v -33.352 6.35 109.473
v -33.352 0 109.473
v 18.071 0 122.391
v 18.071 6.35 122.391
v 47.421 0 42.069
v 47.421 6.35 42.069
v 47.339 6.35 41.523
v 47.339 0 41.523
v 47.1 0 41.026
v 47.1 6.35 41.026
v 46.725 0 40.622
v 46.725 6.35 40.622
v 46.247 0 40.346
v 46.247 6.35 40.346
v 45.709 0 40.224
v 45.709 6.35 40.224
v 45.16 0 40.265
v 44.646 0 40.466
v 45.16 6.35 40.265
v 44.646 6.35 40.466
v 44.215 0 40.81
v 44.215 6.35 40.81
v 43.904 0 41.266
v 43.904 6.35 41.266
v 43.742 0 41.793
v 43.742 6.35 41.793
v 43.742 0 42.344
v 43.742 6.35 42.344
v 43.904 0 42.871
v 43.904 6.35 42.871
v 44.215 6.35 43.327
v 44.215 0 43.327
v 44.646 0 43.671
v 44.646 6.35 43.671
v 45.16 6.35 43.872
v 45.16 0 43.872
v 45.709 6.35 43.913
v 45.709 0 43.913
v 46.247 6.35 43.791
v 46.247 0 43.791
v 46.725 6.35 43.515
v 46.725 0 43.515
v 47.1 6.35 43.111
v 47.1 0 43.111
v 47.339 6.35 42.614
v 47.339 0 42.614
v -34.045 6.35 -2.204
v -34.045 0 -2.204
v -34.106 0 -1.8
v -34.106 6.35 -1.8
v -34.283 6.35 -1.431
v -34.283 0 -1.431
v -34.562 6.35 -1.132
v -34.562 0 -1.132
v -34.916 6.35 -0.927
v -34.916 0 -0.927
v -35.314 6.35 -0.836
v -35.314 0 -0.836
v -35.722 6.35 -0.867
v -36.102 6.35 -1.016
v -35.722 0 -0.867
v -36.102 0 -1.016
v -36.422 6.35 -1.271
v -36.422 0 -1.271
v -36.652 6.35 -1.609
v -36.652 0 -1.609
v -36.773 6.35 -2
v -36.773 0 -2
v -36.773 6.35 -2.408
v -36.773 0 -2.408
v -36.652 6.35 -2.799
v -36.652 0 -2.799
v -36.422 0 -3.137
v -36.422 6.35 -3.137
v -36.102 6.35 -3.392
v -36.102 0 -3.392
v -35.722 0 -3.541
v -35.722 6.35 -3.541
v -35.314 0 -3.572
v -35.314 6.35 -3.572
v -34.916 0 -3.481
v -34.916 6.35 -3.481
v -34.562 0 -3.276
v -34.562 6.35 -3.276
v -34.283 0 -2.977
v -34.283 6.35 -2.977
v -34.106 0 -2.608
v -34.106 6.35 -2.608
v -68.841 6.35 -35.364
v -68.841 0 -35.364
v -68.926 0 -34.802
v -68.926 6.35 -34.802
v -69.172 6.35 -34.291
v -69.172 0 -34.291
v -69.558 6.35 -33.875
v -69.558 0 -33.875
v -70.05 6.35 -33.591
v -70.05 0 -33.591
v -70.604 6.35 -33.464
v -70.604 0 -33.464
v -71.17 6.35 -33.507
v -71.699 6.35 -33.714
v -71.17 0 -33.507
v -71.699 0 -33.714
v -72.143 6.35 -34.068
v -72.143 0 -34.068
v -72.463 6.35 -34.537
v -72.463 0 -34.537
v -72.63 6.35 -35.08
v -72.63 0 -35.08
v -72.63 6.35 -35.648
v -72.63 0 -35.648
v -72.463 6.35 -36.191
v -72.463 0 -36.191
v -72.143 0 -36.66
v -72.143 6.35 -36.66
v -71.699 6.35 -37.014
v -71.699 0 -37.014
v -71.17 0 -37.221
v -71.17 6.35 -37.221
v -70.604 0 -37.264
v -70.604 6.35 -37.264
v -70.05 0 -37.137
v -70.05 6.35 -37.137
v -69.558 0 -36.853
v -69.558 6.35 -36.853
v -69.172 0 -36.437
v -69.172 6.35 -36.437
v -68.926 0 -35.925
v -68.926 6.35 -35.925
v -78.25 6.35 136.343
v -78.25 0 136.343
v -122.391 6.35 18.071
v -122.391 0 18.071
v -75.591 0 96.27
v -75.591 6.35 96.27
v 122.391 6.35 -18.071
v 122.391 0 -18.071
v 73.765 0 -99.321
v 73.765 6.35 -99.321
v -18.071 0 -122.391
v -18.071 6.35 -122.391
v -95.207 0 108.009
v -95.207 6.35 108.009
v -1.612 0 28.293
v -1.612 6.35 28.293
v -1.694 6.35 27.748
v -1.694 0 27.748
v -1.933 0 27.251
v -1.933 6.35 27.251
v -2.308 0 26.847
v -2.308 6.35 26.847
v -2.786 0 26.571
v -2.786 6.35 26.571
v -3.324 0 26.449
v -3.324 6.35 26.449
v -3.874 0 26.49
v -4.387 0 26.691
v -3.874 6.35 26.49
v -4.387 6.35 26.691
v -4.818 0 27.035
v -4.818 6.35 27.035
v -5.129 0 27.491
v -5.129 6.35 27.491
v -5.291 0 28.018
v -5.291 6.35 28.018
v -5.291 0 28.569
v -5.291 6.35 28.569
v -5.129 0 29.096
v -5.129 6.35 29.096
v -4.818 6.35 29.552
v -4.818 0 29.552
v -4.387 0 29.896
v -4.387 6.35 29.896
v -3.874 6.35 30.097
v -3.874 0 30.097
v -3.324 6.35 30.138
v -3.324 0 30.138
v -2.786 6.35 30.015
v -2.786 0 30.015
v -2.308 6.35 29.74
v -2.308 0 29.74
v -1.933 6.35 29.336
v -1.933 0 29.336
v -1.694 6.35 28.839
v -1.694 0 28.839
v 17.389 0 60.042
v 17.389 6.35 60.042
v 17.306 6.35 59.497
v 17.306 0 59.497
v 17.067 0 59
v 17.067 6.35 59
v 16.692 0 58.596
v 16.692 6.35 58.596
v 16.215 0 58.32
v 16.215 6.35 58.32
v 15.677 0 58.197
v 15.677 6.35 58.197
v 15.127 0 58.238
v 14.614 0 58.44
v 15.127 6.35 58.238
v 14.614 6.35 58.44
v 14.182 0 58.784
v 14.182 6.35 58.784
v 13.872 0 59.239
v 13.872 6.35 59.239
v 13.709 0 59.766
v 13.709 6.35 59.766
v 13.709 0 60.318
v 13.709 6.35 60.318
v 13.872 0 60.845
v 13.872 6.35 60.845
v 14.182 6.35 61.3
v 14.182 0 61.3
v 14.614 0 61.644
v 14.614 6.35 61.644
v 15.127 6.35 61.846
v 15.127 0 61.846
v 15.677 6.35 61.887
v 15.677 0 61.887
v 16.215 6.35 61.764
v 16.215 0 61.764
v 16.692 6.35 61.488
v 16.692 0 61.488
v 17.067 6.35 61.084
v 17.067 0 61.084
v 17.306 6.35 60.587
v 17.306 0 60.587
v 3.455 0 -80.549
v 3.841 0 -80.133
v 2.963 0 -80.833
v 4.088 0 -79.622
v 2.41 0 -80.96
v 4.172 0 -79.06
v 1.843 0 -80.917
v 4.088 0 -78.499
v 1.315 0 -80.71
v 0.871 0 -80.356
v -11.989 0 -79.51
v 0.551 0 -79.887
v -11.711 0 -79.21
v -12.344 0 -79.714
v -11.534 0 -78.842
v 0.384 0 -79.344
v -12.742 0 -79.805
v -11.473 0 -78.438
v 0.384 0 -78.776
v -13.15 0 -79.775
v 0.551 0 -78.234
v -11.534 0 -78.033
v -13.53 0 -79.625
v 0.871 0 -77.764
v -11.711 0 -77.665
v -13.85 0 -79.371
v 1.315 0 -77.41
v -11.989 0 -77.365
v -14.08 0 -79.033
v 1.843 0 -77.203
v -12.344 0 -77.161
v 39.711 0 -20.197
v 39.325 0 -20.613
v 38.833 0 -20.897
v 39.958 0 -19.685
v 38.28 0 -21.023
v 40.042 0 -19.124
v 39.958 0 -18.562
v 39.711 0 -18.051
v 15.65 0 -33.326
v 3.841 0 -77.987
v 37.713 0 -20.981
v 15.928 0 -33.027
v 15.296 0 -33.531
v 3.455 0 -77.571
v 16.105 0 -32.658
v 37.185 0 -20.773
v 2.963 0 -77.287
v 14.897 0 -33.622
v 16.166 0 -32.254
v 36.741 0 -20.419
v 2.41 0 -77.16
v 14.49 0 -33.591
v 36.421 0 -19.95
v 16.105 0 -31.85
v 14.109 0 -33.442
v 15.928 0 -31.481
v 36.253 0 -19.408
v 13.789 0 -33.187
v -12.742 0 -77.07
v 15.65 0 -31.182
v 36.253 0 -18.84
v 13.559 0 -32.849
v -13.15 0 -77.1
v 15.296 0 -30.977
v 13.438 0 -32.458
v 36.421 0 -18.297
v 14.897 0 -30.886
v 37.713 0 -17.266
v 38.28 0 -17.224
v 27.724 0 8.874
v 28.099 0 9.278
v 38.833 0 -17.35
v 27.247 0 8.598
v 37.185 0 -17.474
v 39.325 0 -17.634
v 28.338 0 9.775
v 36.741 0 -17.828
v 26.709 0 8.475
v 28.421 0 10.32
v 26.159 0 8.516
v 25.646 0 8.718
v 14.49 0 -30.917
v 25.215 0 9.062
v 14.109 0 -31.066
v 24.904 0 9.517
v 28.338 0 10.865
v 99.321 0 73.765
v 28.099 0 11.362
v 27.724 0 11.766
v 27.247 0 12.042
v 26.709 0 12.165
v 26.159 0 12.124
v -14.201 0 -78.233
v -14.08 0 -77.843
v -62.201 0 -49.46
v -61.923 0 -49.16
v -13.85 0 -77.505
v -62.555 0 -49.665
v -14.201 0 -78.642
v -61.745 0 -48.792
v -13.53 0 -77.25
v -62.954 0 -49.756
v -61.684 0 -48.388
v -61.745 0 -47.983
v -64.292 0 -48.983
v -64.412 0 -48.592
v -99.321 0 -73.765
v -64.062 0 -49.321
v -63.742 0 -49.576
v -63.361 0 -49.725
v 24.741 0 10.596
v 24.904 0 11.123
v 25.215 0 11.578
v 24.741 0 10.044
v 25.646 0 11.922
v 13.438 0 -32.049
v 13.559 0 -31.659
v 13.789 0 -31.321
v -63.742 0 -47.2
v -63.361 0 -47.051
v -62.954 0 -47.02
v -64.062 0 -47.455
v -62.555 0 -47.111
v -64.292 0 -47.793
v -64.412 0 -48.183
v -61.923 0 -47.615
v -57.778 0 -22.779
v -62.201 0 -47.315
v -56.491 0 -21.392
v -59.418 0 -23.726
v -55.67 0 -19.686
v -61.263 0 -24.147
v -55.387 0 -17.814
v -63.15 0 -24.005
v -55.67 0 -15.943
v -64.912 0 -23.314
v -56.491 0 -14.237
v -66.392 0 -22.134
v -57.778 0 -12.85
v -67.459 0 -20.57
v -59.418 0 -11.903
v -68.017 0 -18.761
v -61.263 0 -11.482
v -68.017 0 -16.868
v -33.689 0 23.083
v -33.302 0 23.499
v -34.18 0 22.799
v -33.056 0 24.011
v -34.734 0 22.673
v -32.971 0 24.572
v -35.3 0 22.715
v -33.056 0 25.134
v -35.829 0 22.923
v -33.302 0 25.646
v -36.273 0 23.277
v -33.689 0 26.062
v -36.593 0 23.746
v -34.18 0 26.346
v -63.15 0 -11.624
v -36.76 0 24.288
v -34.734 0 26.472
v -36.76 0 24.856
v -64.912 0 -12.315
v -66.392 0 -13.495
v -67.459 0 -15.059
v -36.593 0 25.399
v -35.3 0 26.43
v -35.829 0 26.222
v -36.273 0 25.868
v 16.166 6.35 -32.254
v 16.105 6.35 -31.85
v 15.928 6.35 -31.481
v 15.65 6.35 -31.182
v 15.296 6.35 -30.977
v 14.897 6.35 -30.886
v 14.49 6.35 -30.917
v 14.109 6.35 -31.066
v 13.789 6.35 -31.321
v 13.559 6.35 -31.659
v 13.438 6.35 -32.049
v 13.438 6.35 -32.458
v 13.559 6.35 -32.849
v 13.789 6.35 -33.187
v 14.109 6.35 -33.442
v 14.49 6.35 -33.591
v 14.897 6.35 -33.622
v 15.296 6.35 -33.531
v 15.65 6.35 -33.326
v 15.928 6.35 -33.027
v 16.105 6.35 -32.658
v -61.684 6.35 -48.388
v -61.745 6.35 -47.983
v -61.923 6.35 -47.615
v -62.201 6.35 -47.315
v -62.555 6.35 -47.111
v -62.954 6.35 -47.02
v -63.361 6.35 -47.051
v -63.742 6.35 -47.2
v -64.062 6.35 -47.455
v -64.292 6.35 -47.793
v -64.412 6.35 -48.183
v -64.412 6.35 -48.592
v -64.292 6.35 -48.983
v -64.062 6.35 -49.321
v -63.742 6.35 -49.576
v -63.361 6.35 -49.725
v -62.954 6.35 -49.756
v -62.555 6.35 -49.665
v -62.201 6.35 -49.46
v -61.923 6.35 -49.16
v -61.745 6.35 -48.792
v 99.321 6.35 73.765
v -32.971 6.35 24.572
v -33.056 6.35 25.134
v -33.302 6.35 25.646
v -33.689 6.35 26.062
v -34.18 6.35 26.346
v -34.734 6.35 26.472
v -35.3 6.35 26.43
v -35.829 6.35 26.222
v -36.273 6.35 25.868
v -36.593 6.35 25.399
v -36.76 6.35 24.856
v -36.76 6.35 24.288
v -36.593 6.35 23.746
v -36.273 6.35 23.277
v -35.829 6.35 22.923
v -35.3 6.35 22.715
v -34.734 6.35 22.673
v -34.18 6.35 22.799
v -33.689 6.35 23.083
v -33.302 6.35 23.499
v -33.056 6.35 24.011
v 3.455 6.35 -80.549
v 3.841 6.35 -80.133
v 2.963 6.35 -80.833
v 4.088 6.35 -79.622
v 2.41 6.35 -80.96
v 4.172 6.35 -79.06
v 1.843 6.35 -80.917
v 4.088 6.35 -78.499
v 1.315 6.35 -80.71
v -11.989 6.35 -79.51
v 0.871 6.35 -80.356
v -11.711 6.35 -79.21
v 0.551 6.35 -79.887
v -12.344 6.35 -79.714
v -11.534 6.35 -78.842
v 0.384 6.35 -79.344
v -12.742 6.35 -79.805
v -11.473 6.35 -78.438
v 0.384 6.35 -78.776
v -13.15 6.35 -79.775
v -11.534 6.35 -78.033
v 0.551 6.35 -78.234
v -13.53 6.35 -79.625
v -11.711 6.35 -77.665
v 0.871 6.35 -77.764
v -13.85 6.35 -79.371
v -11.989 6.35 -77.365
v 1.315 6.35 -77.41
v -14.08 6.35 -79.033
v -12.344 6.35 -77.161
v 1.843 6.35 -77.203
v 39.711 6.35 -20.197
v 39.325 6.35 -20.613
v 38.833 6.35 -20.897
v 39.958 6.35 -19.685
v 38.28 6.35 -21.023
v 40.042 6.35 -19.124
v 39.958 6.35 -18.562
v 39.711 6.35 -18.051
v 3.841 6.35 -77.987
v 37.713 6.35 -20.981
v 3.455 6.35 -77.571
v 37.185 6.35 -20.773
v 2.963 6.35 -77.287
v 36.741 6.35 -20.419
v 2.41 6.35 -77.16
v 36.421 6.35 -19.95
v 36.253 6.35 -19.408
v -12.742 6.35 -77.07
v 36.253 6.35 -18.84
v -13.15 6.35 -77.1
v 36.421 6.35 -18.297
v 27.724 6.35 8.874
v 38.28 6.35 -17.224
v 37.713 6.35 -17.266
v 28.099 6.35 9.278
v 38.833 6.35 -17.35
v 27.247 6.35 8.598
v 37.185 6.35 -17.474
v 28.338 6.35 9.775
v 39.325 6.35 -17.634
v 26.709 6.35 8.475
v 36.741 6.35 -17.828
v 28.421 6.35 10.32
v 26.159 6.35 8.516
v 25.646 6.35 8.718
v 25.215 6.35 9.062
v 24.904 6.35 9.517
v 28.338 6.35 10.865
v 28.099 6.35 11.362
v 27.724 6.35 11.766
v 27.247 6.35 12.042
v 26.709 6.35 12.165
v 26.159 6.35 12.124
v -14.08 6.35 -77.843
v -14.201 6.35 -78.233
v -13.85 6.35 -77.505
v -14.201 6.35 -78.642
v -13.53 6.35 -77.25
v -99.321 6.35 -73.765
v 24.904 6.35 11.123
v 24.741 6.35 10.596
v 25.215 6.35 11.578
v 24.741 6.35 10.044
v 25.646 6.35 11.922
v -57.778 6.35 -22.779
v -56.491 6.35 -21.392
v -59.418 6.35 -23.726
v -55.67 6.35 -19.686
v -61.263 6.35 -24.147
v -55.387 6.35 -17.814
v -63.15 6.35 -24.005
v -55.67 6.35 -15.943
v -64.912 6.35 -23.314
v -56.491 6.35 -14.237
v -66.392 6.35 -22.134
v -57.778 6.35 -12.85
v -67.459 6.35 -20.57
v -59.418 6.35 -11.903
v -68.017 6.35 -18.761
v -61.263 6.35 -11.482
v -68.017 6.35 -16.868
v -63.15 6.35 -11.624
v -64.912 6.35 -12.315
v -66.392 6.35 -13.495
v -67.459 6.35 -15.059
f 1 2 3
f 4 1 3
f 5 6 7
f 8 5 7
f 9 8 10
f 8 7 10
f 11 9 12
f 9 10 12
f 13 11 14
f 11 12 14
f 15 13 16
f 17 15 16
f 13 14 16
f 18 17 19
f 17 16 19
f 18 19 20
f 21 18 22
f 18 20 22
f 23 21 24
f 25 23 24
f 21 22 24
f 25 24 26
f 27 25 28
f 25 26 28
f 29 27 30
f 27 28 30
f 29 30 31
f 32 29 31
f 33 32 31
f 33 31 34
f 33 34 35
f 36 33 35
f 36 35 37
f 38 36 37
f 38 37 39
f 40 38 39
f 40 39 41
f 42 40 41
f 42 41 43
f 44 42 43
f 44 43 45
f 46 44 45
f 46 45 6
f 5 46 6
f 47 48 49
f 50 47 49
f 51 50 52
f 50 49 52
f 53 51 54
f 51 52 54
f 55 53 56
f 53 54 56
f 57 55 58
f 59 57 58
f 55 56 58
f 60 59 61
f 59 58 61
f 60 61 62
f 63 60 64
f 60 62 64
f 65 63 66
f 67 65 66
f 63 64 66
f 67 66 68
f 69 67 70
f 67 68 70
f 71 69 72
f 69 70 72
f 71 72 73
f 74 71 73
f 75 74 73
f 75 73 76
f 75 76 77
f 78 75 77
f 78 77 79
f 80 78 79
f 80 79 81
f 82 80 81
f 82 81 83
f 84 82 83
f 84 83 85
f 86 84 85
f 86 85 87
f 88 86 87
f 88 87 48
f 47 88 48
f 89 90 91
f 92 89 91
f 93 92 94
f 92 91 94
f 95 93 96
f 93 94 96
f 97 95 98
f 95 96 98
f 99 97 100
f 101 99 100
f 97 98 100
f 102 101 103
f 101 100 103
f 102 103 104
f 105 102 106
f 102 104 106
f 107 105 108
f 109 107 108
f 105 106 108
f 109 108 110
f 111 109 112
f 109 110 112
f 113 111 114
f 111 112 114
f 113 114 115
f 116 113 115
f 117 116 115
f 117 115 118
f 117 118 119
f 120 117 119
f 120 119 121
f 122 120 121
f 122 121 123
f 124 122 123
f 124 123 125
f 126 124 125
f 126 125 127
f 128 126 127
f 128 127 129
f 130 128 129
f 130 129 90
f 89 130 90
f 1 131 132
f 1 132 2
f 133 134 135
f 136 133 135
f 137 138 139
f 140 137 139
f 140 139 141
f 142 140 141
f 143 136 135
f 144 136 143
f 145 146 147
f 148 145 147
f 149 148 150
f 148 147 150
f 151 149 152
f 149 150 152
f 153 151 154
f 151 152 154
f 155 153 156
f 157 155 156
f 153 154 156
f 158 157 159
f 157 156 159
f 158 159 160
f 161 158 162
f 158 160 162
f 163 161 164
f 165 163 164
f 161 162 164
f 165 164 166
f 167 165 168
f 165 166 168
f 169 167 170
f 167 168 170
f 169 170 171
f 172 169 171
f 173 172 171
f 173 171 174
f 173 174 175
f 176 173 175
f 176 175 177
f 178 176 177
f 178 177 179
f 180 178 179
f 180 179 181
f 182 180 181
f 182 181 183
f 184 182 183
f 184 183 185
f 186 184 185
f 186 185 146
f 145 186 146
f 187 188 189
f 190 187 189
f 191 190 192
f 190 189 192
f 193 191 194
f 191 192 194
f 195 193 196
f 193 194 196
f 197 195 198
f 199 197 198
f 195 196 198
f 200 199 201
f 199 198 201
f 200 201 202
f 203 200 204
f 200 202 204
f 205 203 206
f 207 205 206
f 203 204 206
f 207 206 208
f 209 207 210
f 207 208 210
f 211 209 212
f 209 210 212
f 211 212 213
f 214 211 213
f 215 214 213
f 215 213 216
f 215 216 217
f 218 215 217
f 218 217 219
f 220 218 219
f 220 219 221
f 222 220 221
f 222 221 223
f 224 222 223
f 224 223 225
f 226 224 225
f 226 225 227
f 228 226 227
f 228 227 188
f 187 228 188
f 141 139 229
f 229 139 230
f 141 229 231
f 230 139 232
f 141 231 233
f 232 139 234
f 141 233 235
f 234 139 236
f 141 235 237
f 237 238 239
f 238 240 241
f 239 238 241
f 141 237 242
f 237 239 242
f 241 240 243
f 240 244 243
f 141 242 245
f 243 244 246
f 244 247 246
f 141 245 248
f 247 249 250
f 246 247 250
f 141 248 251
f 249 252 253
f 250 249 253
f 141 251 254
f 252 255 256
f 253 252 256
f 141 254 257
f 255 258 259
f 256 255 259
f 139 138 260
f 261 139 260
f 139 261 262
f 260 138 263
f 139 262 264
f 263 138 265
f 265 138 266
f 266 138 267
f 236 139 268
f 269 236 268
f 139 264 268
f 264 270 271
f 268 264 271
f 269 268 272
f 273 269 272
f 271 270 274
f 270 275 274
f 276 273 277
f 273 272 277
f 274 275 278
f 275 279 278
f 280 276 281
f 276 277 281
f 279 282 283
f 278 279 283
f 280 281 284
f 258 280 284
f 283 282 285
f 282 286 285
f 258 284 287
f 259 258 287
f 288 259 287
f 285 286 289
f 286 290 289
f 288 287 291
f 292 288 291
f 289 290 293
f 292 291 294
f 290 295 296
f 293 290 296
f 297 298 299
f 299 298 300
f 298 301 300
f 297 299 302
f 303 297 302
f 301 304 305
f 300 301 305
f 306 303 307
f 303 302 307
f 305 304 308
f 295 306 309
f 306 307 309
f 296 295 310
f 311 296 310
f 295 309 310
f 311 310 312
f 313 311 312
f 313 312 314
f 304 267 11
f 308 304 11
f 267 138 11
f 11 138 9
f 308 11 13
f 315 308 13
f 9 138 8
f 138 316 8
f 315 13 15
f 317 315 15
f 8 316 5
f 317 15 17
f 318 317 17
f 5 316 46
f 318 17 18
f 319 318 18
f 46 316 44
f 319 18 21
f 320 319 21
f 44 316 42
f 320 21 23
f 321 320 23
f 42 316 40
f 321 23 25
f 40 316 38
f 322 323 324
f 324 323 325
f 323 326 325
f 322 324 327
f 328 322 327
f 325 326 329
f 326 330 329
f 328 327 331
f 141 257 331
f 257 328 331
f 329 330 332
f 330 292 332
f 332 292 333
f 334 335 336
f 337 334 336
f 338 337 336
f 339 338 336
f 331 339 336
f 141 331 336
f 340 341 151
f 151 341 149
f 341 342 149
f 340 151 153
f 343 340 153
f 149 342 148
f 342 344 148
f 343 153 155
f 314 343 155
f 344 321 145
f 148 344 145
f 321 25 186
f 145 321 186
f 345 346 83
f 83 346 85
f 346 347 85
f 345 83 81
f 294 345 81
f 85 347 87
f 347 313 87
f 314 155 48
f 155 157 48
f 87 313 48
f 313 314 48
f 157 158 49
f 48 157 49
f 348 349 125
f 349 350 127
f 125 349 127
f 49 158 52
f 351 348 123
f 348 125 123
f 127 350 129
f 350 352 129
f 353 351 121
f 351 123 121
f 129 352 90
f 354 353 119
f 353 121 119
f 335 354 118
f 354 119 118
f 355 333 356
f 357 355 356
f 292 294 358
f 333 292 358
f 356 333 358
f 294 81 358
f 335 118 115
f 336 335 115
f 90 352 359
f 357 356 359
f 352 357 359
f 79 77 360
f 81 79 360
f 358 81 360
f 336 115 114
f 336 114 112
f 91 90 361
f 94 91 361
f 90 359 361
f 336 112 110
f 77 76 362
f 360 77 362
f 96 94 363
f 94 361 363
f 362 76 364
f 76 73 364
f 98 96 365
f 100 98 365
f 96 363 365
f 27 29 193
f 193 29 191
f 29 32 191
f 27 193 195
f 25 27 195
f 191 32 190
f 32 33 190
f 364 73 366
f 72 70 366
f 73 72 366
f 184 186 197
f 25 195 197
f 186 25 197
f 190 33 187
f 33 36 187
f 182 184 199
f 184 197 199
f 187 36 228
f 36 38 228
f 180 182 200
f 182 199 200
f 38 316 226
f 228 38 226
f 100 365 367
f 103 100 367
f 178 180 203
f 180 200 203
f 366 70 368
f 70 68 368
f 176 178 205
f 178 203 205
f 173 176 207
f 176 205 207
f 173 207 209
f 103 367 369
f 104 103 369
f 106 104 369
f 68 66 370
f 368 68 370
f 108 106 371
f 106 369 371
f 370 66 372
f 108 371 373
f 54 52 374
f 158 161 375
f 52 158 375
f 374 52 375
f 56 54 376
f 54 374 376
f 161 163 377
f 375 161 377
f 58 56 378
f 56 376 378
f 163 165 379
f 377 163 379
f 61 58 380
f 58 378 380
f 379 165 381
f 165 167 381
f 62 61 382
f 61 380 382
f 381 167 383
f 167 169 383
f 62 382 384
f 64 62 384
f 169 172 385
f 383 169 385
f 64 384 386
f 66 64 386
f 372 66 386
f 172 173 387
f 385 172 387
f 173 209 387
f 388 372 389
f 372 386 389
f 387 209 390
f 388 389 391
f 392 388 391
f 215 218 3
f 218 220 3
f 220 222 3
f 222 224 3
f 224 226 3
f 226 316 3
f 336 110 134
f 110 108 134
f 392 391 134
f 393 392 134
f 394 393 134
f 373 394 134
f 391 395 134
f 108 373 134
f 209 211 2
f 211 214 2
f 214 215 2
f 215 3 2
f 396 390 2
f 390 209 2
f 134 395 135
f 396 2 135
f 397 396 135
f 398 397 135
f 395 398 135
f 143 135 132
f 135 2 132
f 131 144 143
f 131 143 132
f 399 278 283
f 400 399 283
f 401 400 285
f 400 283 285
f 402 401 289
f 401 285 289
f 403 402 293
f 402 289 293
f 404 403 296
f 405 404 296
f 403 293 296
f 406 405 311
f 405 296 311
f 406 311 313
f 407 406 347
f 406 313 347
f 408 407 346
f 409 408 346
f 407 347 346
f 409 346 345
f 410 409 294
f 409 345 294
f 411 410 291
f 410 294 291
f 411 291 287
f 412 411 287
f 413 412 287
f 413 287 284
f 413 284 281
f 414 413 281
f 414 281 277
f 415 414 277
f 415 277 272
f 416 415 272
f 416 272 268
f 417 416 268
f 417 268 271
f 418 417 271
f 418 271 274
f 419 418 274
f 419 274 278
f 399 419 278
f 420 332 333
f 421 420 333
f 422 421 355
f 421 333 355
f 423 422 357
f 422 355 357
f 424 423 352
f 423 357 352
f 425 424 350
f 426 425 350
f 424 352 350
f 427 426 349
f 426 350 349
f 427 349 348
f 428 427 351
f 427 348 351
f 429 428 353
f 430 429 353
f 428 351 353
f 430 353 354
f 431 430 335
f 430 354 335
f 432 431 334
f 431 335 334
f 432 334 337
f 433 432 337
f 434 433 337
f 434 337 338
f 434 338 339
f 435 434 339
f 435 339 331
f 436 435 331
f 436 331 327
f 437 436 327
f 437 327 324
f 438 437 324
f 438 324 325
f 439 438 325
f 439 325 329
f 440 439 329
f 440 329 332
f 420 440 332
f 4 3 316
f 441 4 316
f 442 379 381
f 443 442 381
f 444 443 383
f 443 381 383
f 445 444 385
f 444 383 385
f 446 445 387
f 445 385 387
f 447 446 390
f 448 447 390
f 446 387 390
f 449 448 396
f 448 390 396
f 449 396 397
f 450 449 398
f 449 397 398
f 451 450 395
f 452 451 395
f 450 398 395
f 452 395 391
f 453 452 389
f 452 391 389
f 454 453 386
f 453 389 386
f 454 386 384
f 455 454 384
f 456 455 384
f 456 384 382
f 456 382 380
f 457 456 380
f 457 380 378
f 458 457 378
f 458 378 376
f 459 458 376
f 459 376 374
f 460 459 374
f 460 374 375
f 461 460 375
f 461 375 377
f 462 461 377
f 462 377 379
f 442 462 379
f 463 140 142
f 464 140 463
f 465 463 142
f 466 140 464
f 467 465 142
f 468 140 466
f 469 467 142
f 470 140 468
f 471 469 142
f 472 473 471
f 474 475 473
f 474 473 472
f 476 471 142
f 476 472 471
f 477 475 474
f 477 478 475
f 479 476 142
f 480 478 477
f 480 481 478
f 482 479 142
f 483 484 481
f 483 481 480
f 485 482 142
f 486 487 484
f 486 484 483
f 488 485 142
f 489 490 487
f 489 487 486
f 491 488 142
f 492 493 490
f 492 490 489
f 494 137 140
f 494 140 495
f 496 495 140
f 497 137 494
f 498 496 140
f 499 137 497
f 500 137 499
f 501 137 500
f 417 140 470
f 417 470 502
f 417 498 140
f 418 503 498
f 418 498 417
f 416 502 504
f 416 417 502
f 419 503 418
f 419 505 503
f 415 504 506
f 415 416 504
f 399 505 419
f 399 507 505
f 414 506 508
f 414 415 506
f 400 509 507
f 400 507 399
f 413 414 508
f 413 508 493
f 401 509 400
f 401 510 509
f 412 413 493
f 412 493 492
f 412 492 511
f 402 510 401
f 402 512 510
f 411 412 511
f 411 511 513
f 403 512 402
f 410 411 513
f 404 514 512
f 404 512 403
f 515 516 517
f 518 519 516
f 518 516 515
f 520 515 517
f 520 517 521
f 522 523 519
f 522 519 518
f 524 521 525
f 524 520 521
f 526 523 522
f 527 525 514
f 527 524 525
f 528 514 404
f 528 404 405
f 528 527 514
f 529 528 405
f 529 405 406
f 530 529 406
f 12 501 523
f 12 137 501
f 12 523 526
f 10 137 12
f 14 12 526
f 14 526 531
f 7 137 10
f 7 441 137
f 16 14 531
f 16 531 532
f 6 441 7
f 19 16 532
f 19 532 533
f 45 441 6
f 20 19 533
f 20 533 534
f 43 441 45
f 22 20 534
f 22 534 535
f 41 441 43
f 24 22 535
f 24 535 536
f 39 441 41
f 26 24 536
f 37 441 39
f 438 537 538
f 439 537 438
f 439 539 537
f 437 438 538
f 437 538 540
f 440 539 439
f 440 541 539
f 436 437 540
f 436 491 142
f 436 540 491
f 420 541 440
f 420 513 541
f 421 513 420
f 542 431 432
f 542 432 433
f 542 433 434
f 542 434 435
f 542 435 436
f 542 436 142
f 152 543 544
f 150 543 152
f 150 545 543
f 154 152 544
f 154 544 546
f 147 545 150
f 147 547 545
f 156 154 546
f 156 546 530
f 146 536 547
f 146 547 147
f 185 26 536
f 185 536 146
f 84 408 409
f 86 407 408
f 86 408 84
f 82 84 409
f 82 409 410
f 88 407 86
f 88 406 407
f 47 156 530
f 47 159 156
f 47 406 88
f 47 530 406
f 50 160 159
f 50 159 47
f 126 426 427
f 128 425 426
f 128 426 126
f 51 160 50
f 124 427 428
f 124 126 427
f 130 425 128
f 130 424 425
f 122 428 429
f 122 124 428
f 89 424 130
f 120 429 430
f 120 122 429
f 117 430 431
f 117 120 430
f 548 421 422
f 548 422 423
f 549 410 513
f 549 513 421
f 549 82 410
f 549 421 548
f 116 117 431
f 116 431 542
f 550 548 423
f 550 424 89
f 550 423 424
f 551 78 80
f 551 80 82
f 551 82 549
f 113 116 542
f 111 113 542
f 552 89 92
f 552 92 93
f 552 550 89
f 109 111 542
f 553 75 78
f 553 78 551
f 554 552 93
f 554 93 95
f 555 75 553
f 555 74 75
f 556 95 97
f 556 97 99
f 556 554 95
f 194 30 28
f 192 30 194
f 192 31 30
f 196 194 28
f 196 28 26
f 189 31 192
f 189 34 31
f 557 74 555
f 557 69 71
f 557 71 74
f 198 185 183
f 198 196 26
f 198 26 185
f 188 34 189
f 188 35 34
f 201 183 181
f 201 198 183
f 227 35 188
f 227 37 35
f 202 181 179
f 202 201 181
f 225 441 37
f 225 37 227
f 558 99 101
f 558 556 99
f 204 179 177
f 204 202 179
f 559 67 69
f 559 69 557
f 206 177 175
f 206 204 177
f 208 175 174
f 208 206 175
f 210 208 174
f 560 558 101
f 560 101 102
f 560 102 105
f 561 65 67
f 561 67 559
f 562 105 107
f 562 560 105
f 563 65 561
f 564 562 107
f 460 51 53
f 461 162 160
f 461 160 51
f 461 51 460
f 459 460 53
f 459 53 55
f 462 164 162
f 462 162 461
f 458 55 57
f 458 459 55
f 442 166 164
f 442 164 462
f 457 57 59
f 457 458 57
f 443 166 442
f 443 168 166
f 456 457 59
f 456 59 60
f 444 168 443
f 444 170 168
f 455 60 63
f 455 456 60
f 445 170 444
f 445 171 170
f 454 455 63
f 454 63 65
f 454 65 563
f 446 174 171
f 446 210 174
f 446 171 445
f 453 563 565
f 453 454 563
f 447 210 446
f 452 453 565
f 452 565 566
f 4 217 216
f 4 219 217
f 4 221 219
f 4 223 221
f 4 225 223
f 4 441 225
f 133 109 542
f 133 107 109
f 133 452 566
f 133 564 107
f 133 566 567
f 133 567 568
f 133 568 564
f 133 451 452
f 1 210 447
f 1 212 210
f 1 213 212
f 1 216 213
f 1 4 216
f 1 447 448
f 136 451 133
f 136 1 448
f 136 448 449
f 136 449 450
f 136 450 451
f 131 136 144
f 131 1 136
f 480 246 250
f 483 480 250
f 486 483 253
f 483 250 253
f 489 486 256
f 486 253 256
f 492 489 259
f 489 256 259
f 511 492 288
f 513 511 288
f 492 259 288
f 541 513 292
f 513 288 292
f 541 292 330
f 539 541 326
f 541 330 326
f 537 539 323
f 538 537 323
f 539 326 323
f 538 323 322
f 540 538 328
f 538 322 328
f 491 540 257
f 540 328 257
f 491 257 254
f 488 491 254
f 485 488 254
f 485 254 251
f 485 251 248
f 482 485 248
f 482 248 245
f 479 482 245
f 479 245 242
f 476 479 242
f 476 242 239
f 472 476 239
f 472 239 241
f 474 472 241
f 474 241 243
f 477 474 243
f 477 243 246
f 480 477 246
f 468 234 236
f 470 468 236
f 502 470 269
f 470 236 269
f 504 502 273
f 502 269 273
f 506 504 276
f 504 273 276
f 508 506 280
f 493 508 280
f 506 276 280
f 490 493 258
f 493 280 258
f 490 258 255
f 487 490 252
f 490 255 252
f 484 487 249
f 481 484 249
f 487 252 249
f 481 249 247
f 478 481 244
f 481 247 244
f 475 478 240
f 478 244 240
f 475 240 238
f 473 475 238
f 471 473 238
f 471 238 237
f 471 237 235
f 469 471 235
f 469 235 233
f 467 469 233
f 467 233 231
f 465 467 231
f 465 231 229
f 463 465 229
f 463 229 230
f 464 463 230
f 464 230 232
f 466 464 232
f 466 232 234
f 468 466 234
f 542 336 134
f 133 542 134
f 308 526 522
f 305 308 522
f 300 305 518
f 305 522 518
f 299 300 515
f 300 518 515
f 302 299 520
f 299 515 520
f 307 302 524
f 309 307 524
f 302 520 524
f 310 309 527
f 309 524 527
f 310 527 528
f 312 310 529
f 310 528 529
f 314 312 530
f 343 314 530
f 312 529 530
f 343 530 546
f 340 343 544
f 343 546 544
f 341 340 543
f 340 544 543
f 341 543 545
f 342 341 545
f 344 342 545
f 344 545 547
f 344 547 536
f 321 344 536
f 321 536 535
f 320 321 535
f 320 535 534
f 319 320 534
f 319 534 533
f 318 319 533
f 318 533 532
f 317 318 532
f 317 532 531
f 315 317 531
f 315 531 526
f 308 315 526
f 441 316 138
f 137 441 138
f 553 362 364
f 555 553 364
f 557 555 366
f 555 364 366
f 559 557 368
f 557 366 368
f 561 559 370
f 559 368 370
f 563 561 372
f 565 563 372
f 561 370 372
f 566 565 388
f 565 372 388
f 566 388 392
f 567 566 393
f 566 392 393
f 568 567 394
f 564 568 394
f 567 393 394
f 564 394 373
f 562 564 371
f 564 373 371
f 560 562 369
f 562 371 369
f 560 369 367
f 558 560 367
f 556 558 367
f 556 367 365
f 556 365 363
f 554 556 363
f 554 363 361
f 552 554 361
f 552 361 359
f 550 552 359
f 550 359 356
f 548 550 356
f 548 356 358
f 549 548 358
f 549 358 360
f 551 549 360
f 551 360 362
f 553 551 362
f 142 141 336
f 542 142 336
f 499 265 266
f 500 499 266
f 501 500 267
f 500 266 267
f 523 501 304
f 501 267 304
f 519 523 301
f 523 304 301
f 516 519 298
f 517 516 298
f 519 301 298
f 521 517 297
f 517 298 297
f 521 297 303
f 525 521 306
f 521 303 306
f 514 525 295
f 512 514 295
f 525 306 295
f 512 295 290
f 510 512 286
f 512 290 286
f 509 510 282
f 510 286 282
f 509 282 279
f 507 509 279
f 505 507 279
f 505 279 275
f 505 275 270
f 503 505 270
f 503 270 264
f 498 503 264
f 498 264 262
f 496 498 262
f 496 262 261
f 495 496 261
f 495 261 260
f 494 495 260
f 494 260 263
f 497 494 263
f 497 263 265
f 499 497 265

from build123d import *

# Parameters (mm, degrees)
BOSS_EXTRUDE2_DEPTH = 6.35
BOSS_EXTRUDE3_DEPTH = 6.35
SKETCH3_R           = 1.3716
CUT_EXTRUDE1_DEPTH  = 7.35
SKETCH4_R           = 6.35
CUT_EXTRUDE2_DEPTH  = 7.35
SKETCH5_R           = 1.905
CUT_EXTRUDE3_DEPTH  = 7.35
SKETCH7_R           = 1.85
CUT_EXTRUDE4_DEPTH  = 7.35


with BuildPart() as part:
    # Sketch1 → Boss-Extrude2 (new body)
    with BuildSketch(Plane(origin=(0, 0, 0), x_dir=(1, 0, 0), z_dir=(0, 1, 0))):
        Polygon((73.764977758, 99.321348004), (-18.071082704, 122.390514677), (-99.321348004, 73.764977758), (-122.390514677, -18.071082704), (-73.764977758, -99.321348004), (18.071082704, -122.390514677), (99.321348004, -73.764977758), (122.390514677, 18.071082704), align=None)
    extrude(amount=BOSS_EXTRUDE2_DEPTH)

    # Sketch2 → Boss-Extrude3 (add)
    with BuildSketch(Plane(origin=(0, 6.35, 0), x_dir=(-1, 0, 0), z_dir=(0, 1, 0))):
        Polygon((75.591082235, 96.270040344), (95.206631479, 108.009283415), (78.249947043, 136.342854545), (33.35213433, 109.473031516), (73.764977758, 99.321348004), align=None)
    extrude(amount=-BOSS_EXTRUDE3_DEPTH)

    # Sketch3 → Cut-Extrude1 (cut, through all)
    with BuildSketch(Plane.XZ):
        with Locations((-12.844640601, -78.437638464)):
            Circle(SKETCH3_R)
        with Locations((-35.416692023, -2.204063982)):
            Circle(SKETCH3_R)
        with Locations((-63.056087654, -48.387784923)):
            Circle(SKETCH3_R)
        with Locations((14.794755029, -32.253917523)):
            Circle(SKETCH3_R)
    extrude(amount=-CUT_EXTRUDE1_DEPTH, mode=Mode.SUBTRACT)

    # Sketch4 → Cut-Extrude2 (cut, through all)
    with BuildSketch(Plane.XZ):
        with Locations((-61.737440704, -17.814468138)):
            Circle(SKETCH4_R)
    extrude(amount=-CUT_EXTRUDE2_DEPTH, mode=Mode.SUBTRACT)

    # Sketch5 → Cut-Extrude3 (cut, through all)
    with BuildSketch(Plane.XZ):
        with Locations((2.267257691, -79.060054342)):
            Circle(SKETCH5_R)
        with Locations((-70.746175604, -35.363982912)):
            Circle(SKETCH5_R)
        with Locations((38.137167074, -19.123653876)):
            Circle(SKETCH5_R)
        with Locations((-34.876266221, 24.572417555)):
            Circle(SKETCH5_R)
    extrude(amount=-CUT_EXTRUDE3_DEPTH, mode=Mode.SUBTRACT)

    # Sketch7 → Cut-Extrude4 (cut, through all)
    with BuildSketch(Plane(origin=(0, 6.35, 0), x_dir=(1, 0, 0), z_dir=(0, 1, 0))):
        with Locations((15.538619902, -60.042079341)):
            Circle(SKETCH7_R)
        with Locations((-3.461904754, -28.29337759)):
            Circle(SKETCH7_R)
        with Locations((26.570650956, -10.319908322)):
            Circle(SKETCH7_R)
        with Locations((45.571175611, -42.068610072)):
            Circle(SKETCH7_R)
    extrude(amount=-CUT_EXTRUDE4_DEPTH, mode=Mode.SUBTRACT)


solid = part.part
